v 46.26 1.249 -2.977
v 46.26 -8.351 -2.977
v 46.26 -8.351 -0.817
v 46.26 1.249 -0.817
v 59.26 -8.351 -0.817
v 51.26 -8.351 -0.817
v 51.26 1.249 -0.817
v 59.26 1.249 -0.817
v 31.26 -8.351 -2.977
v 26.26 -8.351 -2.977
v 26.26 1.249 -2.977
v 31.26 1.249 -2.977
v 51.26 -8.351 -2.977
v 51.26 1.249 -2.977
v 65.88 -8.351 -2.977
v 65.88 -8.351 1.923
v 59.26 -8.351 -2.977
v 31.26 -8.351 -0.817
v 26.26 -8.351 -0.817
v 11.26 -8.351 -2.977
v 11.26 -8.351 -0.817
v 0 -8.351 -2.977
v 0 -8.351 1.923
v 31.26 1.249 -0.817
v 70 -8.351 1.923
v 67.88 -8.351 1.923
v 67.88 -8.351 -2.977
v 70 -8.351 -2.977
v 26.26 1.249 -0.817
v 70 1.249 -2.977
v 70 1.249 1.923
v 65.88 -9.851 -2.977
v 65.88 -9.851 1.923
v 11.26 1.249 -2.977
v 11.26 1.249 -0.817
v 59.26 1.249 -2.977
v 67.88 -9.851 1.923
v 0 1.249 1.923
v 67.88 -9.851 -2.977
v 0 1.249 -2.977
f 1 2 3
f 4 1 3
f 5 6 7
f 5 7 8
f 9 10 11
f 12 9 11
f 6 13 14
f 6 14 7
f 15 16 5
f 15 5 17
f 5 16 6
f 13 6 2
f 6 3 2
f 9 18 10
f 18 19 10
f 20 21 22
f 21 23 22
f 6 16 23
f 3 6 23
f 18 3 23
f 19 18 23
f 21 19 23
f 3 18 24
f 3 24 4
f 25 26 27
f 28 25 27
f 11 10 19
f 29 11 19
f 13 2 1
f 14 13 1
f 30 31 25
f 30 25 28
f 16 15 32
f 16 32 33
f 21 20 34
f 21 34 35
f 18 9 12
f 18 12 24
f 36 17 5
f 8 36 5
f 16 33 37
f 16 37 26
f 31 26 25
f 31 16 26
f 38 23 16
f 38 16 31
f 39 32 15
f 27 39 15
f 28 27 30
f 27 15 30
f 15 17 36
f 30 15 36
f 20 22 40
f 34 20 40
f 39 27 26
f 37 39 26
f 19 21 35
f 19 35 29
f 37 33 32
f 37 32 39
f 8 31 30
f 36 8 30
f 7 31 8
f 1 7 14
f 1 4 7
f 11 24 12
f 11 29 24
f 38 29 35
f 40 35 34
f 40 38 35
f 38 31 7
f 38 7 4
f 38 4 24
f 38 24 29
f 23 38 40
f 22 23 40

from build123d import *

# Parameters (mm, degrees)
SKETCH_1_W          = 4.9
SKETCH_1_H          = 9.6
EXTRUDE_1_DEPTH     = 70
SKETCH_2_W          = 8
SKETCH_2_H          = 2.159316865
SKETCH_2_W_2        = 15
CUT_EXTRUDE_1_DEPTH = 71.717892378
SKETCH_3_W          = 2
SKETCH_3_H          = 4.9
EXTRUDE_2_DEPTH     = 1.5


with BuildPart() as part:
    # 草图1 → 凸台-拉伸1 (new body)
    with BuildSketch(Plane(origin=(0, 0, 0), x_dir=(0, 0, -1), z_dir=(1, 0, 0))):
        with Locations((0.526626016, -3.550608051)):
            Rectangle(SKETCH_1_W, SKETCH_1_H)
    extrude(amount=EXTRUDE_1_DEPTH)

    # 草图2 → 切除-拉伸1 (cut, through all)
    with BuildSketch(Plane.XZ.offset(8.350608051)):
        with Locations((55.26, -1.896967583)):
            Rectangle(SKETCH_2_W, SKETCH_2_H)
        with Locations((38.76, -1.896967583)):
            Rectangle(SKETCH_2_W_2, SKETCH_2_H)
        with Locations((18.76, -1.896967583)):
            Rectangle(SKETCH_2_W_2, SKETCH_2_H)
    extrude(amount=-CUT_EXTRUDE_1_DEPTH, mode=Mode.SUBTRACT)

    # 草图3 → 凸台-拉伸2 (add)
    with BuildSketch(Plane.XZ.offset(8.350608051)):
        with Locations((66.88, -0.526626016)):
            Rectangle(SKETCH_3_W, SKETCH_3_H)
    extrude(amount=EXTRUDE_2_DEPTH)


solid = part.part
